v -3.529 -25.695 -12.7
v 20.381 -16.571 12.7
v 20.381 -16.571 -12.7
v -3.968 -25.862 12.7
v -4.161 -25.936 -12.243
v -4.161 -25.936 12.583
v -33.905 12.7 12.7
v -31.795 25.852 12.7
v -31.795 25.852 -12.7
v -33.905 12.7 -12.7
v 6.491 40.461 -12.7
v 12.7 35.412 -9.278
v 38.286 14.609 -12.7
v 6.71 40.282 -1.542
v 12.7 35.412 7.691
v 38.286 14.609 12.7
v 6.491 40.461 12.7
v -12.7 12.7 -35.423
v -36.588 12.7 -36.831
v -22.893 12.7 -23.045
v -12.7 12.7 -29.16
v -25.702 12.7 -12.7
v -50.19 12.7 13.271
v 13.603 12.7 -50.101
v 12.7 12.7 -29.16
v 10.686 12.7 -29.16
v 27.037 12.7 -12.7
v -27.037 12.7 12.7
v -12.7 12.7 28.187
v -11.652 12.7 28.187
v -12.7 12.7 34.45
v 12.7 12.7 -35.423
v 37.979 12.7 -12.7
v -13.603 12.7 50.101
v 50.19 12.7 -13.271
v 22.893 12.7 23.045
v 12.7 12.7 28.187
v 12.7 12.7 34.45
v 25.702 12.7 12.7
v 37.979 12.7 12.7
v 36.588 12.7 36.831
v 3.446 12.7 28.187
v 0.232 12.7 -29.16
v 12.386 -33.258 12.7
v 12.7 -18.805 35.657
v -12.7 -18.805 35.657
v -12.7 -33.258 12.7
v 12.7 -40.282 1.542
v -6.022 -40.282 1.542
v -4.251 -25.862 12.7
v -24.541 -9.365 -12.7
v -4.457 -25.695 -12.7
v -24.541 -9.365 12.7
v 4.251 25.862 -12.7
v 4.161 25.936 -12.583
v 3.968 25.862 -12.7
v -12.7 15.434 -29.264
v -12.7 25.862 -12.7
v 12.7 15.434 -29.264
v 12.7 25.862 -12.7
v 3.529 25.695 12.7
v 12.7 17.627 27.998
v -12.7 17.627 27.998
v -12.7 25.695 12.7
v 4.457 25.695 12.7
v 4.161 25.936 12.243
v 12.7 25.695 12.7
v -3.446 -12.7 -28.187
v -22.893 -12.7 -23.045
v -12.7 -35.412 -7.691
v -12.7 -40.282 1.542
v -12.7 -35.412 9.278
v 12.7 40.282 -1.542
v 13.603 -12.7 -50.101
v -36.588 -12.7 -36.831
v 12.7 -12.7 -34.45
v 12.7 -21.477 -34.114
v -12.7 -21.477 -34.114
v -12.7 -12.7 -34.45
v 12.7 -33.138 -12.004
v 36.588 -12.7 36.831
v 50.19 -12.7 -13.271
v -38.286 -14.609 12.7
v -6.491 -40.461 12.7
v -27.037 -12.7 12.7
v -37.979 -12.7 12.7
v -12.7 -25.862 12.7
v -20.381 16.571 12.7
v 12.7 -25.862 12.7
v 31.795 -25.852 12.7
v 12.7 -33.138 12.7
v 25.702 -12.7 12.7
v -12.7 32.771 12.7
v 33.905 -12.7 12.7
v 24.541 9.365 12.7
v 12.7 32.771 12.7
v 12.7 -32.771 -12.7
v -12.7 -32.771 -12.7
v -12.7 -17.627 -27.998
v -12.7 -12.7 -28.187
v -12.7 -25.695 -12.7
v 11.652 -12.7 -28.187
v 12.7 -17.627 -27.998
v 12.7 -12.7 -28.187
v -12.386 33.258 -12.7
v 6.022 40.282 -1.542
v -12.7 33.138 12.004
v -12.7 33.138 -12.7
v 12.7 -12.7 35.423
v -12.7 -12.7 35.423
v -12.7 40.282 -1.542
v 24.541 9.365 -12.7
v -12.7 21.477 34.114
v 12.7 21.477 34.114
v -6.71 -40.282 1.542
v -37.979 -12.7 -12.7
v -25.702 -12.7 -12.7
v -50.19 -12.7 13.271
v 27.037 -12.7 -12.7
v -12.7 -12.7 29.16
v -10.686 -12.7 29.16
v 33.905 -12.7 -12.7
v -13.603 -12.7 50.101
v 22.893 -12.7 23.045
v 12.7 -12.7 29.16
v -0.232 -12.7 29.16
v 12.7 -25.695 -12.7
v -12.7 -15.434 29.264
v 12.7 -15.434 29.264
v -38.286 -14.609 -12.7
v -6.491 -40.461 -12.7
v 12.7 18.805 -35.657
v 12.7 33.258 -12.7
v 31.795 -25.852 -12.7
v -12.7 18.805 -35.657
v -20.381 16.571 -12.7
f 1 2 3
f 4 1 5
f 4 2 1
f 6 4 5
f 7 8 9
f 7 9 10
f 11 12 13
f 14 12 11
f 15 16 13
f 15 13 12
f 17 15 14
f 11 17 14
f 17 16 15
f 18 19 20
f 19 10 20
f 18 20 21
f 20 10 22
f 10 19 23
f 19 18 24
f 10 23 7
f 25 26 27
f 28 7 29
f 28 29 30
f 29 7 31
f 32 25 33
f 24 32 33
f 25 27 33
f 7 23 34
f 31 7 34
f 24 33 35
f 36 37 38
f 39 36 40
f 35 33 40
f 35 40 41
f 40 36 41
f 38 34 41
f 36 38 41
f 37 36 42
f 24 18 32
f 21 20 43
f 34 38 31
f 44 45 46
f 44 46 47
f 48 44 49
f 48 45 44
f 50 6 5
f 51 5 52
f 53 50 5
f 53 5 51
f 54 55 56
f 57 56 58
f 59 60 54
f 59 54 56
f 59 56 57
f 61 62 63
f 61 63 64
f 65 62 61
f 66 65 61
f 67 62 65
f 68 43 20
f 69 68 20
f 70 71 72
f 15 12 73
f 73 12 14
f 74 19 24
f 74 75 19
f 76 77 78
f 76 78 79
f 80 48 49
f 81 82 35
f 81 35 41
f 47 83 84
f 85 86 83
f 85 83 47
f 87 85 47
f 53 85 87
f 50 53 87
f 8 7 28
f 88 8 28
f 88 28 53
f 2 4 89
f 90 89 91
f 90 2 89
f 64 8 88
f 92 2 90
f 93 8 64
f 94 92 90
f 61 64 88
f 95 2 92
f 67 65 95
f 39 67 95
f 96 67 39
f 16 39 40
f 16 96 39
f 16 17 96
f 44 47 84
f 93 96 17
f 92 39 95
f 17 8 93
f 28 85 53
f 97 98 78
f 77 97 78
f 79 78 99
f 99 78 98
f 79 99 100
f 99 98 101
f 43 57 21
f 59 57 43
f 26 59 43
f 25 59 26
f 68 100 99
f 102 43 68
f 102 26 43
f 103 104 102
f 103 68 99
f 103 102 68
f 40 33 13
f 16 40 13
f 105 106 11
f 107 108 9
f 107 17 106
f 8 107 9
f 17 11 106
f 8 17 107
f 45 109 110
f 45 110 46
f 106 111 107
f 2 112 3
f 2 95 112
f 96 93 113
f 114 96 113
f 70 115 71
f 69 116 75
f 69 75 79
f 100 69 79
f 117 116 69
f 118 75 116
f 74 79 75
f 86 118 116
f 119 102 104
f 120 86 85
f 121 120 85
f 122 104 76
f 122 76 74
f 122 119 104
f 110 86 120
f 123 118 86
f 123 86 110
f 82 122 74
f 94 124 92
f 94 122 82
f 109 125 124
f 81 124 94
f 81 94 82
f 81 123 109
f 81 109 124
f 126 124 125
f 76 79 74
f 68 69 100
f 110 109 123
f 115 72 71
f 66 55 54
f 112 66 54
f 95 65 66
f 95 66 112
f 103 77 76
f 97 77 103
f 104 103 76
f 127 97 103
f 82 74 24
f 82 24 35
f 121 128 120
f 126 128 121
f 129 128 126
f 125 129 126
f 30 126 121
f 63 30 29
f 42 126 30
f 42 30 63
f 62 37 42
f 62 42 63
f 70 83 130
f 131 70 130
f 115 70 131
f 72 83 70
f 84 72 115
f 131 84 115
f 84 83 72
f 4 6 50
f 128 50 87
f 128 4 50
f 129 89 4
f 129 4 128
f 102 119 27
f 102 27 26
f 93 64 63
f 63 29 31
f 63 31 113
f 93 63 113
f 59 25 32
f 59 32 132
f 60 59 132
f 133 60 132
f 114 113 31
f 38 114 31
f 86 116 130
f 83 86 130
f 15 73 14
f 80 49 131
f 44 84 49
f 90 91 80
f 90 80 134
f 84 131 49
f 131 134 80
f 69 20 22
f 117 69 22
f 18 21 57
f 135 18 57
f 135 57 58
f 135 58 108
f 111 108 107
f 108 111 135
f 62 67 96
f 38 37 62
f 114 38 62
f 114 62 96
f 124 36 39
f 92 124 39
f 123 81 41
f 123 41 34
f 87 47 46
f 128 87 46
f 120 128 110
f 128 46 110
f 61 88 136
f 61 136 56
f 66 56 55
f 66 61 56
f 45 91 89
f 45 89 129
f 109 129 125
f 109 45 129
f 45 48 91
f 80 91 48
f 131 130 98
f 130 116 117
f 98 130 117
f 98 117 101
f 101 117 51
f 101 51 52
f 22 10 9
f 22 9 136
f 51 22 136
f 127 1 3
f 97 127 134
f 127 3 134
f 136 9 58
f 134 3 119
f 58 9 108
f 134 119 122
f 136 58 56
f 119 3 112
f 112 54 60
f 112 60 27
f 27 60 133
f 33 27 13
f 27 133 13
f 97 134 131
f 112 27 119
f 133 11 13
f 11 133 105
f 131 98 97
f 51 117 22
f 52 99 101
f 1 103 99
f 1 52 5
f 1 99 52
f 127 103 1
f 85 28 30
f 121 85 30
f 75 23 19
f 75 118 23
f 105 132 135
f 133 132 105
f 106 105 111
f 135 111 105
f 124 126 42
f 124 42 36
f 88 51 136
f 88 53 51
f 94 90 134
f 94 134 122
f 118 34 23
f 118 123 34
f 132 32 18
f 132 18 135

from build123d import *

# Parameters (mm, degrees)
F1_DEPTH = 12.7
F3_DEPTH = 12.7
F5_DEPTH = 12.7


with BuildPart() as f1:
    # F0 (on Top) → F1 (new body, symmetric)
    with BuildSketch(Plane.XY):
        Polygon((-38.285638, -14.609469), (-6.490647, -40.46107), (31.79499, -25.8516), (38.285638, 14.609469), (6.490647, 40.46107), (-31.79499, 25.8516), align=None)
        Polygon((20.380874, -16.571108), (-4.160563, -25.935908), (-24.541437, -9.364801), (-20.380874, 16.571108), (4.160563, 25.935908), (24.541437, 9.364801), align=None, mode=Mode.SUBTRACT)
    extrude(amount=F1_DEPTH, both=True)

    # F2 (on Front) → F3 (join, symmetric)
    with BuildSketch(Plane.XZ):
        Polygon((-36.587807, -36.830874), (13.602569, -50.101408), (50.190376, -13.270534), (36.587807, 36.830874), (-13.602569, 50.101408), (-50.190376, 13.270534), align=None)
        Polygon((31.404369, -8.303439), (8.511195, -31.348701), (-22.893174, -23.045262), (-31.404369, 8.303439), (-8.511195, 31.348701), (22.893174, 23.045262), align=None, mode=Mode.SUBTRACT)
    extrude(amount=F3_DEPTH, both=True)

    # F4 (on Right) → F5 (join, symmetric)
    with BuildSketch(Plane.YZ):
        Polygon((-18.805379, 35.656759), (-40.282349, 1.542443), (-21.47697, -34.114316), (18.805379, -35.656759), (40.282349, -1.542443), (21.47697, 34.114316), align=None)
        Polygon((-17.626668, -27.998443), (-33.060696, 1.265921), (-15.434029, 29.264363), (17.626668, 27.998443), (33.060696, -1.265921), (15.434029, -29.264363), align=None, mode=Mode.SUBTRACT)
    extrude(amount=F5_DEPTH, both=True)


solid = f1.part
